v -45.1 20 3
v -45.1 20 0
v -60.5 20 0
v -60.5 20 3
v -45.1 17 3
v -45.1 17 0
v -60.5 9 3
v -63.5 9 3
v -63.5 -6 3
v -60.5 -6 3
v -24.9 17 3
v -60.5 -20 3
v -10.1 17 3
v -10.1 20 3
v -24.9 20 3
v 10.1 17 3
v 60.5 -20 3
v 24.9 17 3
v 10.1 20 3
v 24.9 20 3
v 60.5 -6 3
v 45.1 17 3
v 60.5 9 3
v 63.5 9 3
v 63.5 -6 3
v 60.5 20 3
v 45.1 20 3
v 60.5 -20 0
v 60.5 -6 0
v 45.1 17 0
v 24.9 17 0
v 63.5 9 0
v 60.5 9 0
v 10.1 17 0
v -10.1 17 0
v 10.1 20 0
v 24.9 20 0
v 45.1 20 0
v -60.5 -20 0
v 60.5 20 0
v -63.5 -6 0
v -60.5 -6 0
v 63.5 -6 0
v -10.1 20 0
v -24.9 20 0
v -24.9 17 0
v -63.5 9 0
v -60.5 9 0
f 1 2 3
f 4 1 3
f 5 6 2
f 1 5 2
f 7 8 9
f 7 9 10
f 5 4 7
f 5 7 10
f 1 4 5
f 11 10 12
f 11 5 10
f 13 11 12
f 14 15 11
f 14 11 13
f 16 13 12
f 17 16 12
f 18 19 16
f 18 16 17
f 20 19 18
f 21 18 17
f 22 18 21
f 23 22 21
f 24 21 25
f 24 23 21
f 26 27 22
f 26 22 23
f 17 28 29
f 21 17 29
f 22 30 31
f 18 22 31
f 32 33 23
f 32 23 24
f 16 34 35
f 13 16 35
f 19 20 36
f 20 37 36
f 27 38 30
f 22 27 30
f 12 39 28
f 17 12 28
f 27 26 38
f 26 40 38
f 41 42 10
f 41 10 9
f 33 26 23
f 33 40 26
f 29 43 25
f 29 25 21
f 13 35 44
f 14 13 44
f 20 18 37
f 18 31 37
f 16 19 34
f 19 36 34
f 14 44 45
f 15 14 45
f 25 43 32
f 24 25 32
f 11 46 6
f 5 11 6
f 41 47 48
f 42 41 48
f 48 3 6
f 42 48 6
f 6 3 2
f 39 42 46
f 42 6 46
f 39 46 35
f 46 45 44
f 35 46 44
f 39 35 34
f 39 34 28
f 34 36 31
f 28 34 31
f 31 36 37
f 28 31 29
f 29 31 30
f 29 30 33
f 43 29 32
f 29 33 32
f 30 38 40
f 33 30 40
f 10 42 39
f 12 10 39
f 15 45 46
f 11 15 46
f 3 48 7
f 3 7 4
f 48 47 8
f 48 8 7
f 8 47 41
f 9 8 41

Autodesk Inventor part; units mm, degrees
ref_plane "YZ Plane" through (0, 0, 0) normal (1, 0, 0) x (0, 1, 0)
ref_plane "XZ Plane" through (0, 0, 0) normal (0, 1, 0) x (-1, 0, 0)
ref_plane "XY Plane" through (0, 0, 0) normal (0, 0, 1) x (1, 0, 0)
sketch "Sketch1" plane through (0, 0, 0) normal (0, 0, 1) x (1, 0, 0)
  line L0 (-63.5, -20) -> (63.5, -20)
  line L1 (63.5, -20) -> (63.5, 20)
  line L2 (63.5, 20) -> (-63.5, 20)
  line L3 (-63.5, 20) -> (-63.5, -20)
  line L4 (-63.5, -20) -> (63.5, 20) construction
  line L5 (63.5, -20) -> (-63.5, 20) construction
  line L6 (-63.5, 9) -> (-60.5, 9)
  line L7 (-60.5, 9) -> (-60.5, -6) construction
  line L8 (-60.5, -6) -> (-63.5, -6)
  line L9 (-63.5, -6) -> (-63.5, 9)
  line L10 (-63.5, 9) -> (-60.5, -6) construction
  line L11 (-60.5, 9) -> (-63.5, -6) construction
  line L12 (-45.1, 20) -> (-24.9, 20)
  line L13 (-24.9, 20) -> (-24.9, 17)
  line L14 (-24.9, 17) -> (-45.1, 17)
  line L15 (-45.1, 17) -> (-45.1, 20)
  line L16 (-45.1, 20) -> (-24.9, 17) construction
  line L17 (-24.9, 20) -> (-45.1, 17) construction
  line L18 (-10.1, 20) -> (10.1, 20)
  line L19 (10.1, 20) -> (10.1, 17)
  line L20 (10.1, 17) -> (-10.1, 17)
  line L21 (-10.1, 17) -> (-10.1, 20)
  line L22 (-10.1, 20) -> (10.1, 17) construction
  line L23 (10.1, 20) -> (-10.1, 17) construction
  line L24 (24.9, 20) -> (45.1, 20)
  line L25 (45.1, 20) -> (45.1, 17)
  line L26 (45.1, 17) -> (24.9, 17)
  line L27 (24.9, 17) -> (24.9, 20)
  line L28 (24.9, 20) -> (45.1, 17) construction
  line L29 (45.1, 20) -> (24.9, 17) construction
  line L30 (-60.5, 9) -> (-60.5, 20)
  line L31 (-60.5, -6) -> (-60.5, -20)
  point P0 (0, 0)
  point P1 (-62, 1.5)
  point P2 (-63.5, 0)
  point P3 (-35, 18.5)
  point P4 (0, 18.5)
  point P5 (35, 18.5)
  point P6 (0, 20)
  point P7 (45.1, 20)
  point P8 (24.9, 20)
  point P9 (10.1, 20)
  point P10 (-45.1, 20)
  dimension "d0" = 127
  dimension "d1" = 40
  dimension "d2" = 3
  dimension "d3" = 15
  dimension "d4" = 20.2
  dimension "d5" = 3
  dimension "d6" = 20.2
  dimension "d7" = 3
  dimension "d8" = 20.2
  dimension "d9" = 3
  dimension "d10" = 35
  dimension "d11" = 35
  dimension "d16" = 1.5
extrude "Extrusion1" add sketch "Sketch1" along normal blind 3 contours L3 L8 L31 L0 | L31 L8 L3 L6 L30 L2 L15 L14 L13 L21 L20 L19 L27 L26 L25 L1 L0 | L3 L2 L30 L6
extrude "Extrusion2" cut sketch "Sketch1" along normal through all contours L3 L8 L31 L0 | L3 L2 L30 L6 | L25 L26 L27 L2 | L2 L13 L14 L15 | L19 L20 L21 L2
mirror "Mirror1" about plane through (0, 0, 0) normal (1, 0, 0) of "Extrusion2"
equation "\"d5\" = d2"
equation "\"d6\" = d4"
equation "\"d7\" = d5"
equation "\"d8\" = d6"
equation "\"d9\" = d7"
equation "\"d11\" = d10"
properties part number "bed_acrylic_upper_floort"
